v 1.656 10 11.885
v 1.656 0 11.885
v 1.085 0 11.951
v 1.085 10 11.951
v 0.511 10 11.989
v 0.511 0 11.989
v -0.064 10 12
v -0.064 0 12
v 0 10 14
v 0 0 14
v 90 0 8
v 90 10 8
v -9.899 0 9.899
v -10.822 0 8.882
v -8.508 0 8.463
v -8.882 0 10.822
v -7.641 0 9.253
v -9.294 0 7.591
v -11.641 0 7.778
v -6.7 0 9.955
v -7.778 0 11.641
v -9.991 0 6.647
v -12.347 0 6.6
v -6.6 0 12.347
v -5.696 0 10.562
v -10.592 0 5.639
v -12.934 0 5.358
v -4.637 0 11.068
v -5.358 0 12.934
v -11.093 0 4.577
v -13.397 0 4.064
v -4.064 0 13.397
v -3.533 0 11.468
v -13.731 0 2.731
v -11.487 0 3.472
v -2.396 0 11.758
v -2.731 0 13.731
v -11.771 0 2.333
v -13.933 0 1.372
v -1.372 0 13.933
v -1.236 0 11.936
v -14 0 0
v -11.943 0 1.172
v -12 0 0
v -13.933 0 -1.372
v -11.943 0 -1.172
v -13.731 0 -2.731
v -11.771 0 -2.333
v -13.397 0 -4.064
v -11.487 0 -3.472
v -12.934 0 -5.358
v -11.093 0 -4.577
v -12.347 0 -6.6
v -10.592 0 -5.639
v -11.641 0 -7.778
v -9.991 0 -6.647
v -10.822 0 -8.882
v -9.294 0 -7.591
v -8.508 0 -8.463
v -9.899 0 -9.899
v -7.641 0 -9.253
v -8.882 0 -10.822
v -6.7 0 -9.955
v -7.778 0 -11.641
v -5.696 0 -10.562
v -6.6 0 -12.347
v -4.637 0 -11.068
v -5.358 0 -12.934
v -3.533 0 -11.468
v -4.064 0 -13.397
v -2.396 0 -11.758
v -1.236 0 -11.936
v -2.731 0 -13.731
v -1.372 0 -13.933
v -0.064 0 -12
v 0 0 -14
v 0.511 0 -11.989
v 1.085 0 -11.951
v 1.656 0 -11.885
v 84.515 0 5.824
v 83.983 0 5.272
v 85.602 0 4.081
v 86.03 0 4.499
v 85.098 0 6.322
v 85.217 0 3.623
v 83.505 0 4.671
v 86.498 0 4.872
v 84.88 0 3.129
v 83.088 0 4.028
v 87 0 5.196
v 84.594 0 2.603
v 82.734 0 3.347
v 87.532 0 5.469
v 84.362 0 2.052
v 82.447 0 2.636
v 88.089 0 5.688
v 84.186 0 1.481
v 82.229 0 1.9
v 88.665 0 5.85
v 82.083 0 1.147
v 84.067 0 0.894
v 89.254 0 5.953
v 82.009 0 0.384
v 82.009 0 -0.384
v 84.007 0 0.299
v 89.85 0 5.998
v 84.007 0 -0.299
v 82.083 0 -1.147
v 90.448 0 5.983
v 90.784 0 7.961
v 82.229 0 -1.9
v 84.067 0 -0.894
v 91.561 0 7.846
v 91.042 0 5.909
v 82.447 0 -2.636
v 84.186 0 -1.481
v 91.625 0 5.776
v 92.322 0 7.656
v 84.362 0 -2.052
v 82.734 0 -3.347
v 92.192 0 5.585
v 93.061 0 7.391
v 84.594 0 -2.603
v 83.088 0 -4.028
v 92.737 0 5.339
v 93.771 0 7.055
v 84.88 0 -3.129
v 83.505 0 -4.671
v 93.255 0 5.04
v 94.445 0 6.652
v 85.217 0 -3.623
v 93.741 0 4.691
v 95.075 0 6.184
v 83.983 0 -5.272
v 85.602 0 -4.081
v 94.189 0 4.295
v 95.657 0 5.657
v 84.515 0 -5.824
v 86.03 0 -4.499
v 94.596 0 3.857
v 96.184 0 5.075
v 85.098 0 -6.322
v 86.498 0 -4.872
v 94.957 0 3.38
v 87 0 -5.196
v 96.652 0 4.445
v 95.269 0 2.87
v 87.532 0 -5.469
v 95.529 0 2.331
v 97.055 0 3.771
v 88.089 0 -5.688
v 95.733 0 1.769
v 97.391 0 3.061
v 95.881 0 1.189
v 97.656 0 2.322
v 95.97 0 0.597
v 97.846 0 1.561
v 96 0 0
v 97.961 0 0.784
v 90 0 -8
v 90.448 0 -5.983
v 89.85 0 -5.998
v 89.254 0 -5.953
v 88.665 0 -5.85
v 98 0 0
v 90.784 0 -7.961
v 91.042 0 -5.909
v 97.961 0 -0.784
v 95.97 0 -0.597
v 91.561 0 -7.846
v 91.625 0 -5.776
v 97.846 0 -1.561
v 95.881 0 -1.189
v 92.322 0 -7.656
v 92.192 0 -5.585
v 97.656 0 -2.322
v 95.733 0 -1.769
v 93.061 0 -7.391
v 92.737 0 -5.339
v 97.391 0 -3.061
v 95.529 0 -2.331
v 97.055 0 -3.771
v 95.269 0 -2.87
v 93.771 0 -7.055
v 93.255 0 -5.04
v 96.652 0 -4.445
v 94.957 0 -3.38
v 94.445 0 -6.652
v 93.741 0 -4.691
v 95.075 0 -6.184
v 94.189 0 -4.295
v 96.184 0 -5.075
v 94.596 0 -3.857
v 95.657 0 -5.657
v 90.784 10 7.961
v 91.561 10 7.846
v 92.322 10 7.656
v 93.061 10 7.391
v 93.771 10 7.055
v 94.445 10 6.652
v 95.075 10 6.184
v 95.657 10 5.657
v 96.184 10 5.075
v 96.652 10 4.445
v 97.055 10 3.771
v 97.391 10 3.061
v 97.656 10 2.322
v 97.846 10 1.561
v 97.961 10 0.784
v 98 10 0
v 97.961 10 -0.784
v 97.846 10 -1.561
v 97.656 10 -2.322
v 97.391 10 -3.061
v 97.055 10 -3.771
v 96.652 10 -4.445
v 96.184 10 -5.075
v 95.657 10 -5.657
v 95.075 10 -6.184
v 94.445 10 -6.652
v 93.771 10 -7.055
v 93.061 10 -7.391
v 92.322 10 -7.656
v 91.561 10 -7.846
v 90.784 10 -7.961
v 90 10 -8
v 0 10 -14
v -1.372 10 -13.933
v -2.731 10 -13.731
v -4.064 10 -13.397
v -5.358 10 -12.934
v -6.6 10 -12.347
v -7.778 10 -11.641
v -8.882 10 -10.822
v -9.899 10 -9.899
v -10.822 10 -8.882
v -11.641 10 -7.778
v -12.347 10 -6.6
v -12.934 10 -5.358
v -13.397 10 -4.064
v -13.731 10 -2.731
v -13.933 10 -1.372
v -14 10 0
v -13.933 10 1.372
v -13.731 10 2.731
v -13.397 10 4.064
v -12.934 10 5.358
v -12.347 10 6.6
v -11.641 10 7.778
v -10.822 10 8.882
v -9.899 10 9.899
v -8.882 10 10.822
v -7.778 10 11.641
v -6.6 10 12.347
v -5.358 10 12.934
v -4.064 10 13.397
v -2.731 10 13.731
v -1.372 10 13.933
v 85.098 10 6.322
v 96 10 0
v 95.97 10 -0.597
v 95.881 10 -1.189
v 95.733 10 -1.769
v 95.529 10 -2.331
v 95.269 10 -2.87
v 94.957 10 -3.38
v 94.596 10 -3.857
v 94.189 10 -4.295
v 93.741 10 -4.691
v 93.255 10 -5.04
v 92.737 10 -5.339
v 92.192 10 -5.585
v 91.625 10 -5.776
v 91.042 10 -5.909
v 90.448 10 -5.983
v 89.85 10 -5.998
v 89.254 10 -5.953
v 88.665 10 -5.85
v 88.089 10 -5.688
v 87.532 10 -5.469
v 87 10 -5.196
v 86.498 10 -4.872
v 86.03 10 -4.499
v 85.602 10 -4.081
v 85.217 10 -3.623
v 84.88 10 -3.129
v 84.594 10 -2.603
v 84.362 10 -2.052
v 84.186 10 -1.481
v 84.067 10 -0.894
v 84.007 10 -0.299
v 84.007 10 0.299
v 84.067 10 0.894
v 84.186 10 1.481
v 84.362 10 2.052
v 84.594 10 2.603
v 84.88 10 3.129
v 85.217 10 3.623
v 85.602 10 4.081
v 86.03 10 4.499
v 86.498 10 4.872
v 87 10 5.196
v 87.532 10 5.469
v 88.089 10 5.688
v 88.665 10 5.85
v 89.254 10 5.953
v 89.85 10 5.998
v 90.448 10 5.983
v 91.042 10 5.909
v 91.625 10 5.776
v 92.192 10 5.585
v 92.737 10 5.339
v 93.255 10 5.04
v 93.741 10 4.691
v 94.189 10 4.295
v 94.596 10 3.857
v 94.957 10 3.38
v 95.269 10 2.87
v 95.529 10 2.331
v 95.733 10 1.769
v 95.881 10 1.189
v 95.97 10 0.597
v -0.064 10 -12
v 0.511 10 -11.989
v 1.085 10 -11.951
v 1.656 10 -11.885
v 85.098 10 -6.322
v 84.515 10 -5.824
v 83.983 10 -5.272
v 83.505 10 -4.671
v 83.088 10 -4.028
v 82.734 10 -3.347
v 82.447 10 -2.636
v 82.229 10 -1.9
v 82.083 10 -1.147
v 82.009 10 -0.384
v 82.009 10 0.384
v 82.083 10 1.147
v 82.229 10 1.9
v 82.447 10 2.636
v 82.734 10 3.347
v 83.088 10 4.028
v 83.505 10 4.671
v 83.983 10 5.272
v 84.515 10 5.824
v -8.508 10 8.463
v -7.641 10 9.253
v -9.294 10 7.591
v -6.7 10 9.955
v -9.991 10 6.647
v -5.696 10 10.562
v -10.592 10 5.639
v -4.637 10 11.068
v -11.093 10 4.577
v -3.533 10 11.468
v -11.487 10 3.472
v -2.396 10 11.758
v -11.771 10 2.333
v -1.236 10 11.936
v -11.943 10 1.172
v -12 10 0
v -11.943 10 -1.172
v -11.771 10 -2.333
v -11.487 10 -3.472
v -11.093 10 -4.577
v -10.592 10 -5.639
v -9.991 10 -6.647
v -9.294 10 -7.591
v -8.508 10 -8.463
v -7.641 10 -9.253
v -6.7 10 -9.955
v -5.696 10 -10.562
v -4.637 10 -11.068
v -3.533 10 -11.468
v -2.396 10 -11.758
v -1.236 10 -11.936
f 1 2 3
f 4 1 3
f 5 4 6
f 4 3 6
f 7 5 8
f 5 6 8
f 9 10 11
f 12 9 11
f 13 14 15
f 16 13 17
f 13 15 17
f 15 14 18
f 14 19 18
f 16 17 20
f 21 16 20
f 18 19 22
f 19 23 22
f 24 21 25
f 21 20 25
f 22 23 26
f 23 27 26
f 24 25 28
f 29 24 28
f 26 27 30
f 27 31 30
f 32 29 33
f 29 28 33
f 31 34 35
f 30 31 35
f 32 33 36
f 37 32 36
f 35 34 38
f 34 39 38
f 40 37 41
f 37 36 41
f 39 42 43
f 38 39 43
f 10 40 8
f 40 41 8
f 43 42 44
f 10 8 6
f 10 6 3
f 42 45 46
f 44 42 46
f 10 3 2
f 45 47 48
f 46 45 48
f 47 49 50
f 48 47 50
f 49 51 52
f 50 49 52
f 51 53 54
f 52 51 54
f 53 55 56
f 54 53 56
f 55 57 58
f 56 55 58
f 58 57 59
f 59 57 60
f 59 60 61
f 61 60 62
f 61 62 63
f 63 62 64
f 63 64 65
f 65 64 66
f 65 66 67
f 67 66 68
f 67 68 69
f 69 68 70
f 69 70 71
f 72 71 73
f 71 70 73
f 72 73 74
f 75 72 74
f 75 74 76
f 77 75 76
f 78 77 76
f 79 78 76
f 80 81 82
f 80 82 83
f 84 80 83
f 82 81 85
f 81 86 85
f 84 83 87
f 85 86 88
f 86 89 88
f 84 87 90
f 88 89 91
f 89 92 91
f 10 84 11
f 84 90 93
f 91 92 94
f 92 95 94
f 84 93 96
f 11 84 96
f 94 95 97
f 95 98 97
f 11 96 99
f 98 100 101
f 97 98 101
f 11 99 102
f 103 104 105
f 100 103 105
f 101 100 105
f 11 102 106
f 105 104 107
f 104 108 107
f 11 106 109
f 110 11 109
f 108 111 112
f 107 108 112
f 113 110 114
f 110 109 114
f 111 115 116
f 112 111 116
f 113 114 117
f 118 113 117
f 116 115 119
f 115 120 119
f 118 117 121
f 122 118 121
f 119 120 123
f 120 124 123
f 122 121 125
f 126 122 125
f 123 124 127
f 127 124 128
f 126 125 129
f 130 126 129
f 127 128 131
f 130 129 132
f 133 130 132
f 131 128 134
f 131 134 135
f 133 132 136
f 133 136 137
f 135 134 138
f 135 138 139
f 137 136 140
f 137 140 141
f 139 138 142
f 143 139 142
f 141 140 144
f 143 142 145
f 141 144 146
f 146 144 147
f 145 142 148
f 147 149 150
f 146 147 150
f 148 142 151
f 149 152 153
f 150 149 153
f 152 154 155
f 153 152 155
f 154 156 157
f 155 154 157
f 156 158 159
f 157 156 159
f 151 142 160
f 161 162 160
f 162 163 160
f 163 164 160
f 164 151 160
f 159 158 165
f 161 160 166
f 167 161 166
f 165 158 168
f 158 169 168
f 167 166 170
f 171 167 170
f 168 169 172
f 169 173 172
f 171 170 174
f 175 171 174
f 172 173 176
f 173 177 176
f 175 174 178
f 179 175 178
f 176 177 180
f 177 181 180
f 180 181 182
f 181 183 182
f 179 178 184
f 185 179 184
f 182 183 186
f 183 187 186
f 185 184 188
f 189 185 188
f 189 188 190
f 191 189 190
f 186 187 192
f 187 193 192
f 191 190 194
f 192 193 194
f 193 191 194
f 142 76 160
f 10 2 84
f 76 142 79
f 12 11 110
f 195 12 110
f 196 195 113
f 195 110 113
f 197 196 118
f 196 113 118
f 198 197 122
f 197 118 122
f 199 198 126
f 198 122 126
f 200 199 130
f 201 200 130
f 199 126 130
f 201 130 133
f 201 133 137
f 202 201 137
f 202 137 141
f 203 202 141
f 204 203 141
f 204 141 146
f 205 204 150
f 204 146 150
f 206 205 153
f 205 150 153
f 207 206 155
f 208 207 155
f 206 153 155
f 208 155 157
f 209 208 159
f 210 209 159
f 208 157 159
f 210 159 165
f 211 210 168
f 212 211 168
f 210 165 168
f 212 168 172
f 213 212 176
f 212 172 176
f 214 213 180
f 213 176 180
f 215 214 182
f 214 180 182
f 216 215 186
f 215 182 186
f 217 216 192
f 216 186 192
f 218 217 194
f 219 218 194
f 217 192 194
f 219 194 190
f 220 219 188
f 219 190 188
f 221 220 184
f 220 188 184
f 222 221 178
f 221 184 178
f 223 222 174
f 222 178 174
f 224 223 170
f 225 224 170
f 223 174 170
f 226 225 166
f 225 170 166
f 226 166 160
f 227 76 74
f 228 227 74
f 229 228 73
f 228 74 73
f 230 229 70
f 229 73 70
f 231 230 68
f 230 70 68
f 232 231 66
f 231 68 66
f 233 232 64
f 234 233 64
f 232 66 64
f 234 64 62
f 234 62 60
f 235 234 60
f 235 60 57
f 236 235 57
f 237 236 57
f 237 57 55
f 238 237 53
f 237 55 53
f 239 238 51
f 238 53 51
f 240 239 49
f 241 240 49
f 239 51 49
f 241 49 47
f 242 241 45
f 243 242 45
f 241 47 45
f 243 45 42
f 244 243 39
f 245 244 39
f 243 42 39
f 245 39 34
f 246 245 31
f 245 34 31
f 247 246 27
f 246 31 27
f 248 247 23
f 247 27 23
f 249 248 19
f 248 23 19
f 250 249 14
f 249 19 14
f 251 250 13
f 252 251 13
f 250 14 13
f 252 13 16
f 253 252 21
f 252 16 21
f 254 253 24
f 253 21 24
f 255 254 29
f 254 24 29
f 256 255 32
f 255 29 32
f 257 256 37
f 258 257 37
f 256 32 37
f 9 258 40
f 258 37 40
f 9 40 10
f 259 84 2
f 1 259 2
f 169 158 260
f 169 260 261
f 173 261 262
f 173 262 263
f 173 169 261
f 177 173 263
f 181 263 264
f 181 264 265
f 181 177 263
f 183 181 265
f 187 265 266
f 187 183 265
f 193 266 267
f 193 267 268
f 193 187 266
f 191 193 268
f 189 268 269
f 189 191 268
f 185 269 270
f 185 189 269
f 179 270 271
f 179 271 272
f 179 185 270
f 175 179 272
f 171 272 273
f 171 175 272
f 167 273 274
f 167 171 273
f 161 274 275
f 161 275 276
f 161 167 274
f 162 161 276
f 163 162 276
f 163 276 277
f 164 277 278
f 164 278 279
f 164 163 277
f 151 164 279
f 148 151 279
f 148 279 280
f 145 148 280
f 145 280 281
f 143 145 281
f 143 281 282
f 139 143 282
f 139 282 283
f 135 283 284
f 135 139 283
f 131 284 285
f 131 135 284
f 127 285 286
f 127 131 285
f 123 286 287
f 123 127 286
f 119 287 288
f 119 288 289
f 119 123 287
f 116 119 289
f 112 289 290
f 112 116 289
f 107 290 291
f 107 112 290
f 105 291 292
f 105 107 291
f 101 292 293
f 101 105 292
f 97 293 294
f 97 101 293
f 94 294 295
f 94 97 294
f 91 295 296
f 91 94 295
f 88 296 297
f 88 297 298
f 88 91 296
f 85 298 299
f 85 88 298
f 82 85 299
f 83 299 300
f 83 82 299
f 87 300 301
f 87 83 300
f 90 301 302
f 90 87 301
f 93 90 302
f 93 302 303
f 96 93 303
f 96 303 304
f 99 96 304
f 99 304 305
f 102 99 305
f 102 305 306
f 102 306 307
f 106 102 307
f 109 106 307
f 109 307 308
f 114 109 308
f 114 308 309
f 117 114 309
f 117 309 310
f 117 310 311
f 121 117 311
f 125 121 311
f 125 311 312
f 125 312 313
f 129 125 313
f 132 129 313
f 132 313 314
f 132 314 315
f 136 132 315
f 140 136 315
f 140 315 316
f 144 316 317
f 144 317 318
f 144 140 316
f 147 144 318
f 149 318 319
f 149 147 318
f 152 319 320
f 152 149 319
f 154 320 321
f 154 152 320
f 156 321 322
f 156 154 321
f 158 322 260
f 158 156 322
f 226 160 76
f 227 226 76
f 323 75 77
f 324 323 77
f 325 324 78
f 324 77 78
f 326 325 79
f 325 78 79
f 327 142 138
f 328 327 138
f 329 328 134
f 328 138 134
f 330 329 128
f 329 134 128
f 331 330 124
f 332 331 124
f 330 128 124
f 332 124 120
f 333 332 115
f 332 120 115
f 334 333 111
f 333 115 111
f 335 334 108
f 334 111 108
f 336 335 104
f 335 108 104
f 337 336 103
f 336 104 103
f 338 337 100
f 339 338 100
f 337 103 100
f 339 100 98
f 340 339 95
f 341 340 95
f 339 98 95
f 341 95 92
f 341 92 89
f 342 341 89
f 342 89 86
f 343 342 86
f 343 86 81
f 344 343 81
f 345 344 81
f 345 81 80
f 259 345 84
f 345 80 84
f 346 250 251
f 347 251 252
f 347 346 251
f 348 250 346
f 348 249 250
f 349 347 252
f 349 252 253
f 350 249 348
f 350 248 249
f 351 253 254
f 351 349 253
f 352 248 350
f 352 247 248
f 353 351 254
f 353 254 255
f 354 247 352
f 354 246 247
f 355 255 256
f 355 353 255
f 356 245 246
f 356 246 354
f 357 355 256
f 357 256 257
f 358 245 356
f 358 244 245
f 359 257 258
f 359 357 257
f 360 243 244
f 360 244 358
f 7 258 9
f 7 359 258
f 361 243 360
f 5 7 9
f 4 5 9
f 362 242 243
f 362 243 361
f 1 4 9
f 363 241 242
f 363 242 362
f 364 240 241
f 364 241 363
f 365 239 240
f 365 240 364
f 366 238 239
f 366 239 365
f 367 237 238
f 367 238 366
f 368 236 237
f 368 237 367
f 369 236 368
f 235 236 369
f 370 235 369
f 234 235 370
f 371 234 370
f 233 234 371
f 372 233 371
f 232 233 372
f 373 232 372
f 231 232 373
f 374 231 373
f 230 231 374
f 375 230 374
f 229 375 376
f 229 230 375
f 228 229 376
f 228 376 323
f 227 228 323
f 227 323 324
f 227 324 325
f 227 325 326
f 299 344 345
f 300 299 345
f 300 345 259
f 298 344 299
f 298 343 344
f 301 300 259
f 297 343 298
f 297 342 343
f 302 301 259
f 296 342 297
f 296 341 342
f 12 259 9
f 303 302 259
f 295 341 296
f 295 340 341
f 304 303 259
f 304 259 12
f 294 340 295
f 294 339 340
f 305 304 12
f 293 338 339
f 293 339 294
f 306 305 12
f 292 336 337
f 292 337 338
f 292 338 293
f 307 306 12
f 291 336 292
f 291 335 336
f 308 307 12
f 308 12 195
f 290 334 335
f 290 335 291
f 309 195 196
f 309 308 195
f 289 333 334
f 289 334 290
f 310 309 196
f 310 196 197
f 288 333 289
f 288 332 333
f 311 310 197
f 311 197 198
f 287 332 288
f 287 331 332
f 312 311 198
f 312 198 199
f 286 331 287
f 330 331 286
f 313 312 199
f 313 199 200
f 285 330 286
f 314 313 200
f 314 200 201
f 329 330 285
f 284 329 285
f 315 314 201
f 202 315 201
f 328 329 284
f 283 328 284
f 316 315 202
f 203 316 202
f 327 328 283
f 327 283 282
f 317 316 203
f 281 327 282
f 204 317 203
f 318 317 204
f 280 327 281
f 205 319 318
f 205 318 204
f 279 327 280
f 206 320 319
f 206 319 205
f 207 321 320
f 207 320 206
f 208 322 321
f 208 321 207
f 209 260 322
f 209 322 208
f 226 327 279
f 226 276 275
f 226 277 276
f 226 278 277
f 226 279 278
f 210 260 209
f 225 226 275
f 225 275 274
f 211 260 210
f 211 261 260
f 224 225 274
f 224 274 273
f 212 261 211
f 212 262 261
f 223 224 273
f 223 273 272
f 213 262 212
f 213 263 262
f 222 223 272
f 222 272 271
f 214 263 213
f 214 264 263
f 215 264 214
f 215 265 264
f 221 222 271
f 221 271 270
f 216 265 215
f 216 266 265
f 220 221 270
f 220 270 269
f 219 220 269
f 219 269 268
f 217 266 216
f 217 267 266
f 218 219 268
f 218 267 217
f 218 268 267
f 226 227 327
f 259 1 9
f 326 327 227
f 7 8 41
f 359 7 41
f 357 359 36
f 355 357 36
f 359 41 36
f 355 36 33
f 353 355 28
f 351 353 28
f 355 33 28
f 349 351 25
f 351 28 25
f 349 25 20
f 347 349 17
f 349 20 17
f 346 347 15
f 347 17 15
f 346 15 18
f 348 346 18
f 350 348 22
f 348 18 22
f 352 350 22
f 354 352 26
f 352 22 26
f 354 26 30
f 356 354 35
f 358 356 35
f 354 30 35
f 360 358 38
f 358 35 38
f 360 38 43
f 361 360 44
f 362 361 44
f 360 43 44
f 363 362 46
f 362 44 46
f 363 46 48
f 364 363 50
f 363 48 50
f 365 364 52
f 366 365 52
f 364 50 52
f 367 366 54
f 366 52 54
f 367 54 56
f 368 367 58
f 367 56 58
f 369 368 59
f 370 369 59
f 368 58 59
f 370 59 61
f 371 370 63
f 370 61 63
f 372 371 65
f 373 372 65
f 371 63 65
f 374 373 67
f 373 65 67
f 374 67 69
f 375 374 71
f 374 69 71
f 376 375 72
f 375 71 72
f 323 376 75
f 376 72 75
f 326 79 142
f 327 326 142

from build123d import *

# Parameters (mm, degrees)
SKETCH1_R           = 6
BOSS_EXTRUDE1_DEPTH = 10


with BuildPart() as part:
    # Sketch1 → Boss-Extrude1 (new body)
    with BuildSketch(Plane(origin=(0, 0, 0), x_dir=(1, 0, 0), z_dir=(0, 1, 0))):
        with BuildLine():
            ThreePointArc((0, 14), (-14, 0), (0, -14))
            Line((0, -14), (90, -8))
            ThreePointArc((90, -8), (98, 0), (90, 8))
            Line((90, 8), (0, 14))
        make_face()
        with BuildLine():
            ThreePointArc((1.65636135, -11.885136393), (0.798228126, -11.973421894), (-0.064030313, -11.99982917))
            ThreePointArc((-0.064030313, -11.99982917), (-12, 0), (-0.064030313, 11.99982917))
            ThreePointArc((-0.064030313, 11.99982917), (0.798228126, 11.973421894), (1.65636135, 11.885136393))
            Line((1.65636135, 11.885136393), (85.098173392, 6.322348923))
            ThreePointArc((85.098173392, 6.322348923), (82, 0), (85.098173392, -6.322348923))
            Line((85.098173392, -6.322348923), (1.65636135, -11.885136393))
        make_face(mode=Mode.SUBTRACT)
        with Locations((90, 0)):
            Circle(SKETCH1_R, mode=Mode.SUBTRACT)
    extrude(amount=BOSS_EXTRUDE1_DEPTH)


solid = part.part
